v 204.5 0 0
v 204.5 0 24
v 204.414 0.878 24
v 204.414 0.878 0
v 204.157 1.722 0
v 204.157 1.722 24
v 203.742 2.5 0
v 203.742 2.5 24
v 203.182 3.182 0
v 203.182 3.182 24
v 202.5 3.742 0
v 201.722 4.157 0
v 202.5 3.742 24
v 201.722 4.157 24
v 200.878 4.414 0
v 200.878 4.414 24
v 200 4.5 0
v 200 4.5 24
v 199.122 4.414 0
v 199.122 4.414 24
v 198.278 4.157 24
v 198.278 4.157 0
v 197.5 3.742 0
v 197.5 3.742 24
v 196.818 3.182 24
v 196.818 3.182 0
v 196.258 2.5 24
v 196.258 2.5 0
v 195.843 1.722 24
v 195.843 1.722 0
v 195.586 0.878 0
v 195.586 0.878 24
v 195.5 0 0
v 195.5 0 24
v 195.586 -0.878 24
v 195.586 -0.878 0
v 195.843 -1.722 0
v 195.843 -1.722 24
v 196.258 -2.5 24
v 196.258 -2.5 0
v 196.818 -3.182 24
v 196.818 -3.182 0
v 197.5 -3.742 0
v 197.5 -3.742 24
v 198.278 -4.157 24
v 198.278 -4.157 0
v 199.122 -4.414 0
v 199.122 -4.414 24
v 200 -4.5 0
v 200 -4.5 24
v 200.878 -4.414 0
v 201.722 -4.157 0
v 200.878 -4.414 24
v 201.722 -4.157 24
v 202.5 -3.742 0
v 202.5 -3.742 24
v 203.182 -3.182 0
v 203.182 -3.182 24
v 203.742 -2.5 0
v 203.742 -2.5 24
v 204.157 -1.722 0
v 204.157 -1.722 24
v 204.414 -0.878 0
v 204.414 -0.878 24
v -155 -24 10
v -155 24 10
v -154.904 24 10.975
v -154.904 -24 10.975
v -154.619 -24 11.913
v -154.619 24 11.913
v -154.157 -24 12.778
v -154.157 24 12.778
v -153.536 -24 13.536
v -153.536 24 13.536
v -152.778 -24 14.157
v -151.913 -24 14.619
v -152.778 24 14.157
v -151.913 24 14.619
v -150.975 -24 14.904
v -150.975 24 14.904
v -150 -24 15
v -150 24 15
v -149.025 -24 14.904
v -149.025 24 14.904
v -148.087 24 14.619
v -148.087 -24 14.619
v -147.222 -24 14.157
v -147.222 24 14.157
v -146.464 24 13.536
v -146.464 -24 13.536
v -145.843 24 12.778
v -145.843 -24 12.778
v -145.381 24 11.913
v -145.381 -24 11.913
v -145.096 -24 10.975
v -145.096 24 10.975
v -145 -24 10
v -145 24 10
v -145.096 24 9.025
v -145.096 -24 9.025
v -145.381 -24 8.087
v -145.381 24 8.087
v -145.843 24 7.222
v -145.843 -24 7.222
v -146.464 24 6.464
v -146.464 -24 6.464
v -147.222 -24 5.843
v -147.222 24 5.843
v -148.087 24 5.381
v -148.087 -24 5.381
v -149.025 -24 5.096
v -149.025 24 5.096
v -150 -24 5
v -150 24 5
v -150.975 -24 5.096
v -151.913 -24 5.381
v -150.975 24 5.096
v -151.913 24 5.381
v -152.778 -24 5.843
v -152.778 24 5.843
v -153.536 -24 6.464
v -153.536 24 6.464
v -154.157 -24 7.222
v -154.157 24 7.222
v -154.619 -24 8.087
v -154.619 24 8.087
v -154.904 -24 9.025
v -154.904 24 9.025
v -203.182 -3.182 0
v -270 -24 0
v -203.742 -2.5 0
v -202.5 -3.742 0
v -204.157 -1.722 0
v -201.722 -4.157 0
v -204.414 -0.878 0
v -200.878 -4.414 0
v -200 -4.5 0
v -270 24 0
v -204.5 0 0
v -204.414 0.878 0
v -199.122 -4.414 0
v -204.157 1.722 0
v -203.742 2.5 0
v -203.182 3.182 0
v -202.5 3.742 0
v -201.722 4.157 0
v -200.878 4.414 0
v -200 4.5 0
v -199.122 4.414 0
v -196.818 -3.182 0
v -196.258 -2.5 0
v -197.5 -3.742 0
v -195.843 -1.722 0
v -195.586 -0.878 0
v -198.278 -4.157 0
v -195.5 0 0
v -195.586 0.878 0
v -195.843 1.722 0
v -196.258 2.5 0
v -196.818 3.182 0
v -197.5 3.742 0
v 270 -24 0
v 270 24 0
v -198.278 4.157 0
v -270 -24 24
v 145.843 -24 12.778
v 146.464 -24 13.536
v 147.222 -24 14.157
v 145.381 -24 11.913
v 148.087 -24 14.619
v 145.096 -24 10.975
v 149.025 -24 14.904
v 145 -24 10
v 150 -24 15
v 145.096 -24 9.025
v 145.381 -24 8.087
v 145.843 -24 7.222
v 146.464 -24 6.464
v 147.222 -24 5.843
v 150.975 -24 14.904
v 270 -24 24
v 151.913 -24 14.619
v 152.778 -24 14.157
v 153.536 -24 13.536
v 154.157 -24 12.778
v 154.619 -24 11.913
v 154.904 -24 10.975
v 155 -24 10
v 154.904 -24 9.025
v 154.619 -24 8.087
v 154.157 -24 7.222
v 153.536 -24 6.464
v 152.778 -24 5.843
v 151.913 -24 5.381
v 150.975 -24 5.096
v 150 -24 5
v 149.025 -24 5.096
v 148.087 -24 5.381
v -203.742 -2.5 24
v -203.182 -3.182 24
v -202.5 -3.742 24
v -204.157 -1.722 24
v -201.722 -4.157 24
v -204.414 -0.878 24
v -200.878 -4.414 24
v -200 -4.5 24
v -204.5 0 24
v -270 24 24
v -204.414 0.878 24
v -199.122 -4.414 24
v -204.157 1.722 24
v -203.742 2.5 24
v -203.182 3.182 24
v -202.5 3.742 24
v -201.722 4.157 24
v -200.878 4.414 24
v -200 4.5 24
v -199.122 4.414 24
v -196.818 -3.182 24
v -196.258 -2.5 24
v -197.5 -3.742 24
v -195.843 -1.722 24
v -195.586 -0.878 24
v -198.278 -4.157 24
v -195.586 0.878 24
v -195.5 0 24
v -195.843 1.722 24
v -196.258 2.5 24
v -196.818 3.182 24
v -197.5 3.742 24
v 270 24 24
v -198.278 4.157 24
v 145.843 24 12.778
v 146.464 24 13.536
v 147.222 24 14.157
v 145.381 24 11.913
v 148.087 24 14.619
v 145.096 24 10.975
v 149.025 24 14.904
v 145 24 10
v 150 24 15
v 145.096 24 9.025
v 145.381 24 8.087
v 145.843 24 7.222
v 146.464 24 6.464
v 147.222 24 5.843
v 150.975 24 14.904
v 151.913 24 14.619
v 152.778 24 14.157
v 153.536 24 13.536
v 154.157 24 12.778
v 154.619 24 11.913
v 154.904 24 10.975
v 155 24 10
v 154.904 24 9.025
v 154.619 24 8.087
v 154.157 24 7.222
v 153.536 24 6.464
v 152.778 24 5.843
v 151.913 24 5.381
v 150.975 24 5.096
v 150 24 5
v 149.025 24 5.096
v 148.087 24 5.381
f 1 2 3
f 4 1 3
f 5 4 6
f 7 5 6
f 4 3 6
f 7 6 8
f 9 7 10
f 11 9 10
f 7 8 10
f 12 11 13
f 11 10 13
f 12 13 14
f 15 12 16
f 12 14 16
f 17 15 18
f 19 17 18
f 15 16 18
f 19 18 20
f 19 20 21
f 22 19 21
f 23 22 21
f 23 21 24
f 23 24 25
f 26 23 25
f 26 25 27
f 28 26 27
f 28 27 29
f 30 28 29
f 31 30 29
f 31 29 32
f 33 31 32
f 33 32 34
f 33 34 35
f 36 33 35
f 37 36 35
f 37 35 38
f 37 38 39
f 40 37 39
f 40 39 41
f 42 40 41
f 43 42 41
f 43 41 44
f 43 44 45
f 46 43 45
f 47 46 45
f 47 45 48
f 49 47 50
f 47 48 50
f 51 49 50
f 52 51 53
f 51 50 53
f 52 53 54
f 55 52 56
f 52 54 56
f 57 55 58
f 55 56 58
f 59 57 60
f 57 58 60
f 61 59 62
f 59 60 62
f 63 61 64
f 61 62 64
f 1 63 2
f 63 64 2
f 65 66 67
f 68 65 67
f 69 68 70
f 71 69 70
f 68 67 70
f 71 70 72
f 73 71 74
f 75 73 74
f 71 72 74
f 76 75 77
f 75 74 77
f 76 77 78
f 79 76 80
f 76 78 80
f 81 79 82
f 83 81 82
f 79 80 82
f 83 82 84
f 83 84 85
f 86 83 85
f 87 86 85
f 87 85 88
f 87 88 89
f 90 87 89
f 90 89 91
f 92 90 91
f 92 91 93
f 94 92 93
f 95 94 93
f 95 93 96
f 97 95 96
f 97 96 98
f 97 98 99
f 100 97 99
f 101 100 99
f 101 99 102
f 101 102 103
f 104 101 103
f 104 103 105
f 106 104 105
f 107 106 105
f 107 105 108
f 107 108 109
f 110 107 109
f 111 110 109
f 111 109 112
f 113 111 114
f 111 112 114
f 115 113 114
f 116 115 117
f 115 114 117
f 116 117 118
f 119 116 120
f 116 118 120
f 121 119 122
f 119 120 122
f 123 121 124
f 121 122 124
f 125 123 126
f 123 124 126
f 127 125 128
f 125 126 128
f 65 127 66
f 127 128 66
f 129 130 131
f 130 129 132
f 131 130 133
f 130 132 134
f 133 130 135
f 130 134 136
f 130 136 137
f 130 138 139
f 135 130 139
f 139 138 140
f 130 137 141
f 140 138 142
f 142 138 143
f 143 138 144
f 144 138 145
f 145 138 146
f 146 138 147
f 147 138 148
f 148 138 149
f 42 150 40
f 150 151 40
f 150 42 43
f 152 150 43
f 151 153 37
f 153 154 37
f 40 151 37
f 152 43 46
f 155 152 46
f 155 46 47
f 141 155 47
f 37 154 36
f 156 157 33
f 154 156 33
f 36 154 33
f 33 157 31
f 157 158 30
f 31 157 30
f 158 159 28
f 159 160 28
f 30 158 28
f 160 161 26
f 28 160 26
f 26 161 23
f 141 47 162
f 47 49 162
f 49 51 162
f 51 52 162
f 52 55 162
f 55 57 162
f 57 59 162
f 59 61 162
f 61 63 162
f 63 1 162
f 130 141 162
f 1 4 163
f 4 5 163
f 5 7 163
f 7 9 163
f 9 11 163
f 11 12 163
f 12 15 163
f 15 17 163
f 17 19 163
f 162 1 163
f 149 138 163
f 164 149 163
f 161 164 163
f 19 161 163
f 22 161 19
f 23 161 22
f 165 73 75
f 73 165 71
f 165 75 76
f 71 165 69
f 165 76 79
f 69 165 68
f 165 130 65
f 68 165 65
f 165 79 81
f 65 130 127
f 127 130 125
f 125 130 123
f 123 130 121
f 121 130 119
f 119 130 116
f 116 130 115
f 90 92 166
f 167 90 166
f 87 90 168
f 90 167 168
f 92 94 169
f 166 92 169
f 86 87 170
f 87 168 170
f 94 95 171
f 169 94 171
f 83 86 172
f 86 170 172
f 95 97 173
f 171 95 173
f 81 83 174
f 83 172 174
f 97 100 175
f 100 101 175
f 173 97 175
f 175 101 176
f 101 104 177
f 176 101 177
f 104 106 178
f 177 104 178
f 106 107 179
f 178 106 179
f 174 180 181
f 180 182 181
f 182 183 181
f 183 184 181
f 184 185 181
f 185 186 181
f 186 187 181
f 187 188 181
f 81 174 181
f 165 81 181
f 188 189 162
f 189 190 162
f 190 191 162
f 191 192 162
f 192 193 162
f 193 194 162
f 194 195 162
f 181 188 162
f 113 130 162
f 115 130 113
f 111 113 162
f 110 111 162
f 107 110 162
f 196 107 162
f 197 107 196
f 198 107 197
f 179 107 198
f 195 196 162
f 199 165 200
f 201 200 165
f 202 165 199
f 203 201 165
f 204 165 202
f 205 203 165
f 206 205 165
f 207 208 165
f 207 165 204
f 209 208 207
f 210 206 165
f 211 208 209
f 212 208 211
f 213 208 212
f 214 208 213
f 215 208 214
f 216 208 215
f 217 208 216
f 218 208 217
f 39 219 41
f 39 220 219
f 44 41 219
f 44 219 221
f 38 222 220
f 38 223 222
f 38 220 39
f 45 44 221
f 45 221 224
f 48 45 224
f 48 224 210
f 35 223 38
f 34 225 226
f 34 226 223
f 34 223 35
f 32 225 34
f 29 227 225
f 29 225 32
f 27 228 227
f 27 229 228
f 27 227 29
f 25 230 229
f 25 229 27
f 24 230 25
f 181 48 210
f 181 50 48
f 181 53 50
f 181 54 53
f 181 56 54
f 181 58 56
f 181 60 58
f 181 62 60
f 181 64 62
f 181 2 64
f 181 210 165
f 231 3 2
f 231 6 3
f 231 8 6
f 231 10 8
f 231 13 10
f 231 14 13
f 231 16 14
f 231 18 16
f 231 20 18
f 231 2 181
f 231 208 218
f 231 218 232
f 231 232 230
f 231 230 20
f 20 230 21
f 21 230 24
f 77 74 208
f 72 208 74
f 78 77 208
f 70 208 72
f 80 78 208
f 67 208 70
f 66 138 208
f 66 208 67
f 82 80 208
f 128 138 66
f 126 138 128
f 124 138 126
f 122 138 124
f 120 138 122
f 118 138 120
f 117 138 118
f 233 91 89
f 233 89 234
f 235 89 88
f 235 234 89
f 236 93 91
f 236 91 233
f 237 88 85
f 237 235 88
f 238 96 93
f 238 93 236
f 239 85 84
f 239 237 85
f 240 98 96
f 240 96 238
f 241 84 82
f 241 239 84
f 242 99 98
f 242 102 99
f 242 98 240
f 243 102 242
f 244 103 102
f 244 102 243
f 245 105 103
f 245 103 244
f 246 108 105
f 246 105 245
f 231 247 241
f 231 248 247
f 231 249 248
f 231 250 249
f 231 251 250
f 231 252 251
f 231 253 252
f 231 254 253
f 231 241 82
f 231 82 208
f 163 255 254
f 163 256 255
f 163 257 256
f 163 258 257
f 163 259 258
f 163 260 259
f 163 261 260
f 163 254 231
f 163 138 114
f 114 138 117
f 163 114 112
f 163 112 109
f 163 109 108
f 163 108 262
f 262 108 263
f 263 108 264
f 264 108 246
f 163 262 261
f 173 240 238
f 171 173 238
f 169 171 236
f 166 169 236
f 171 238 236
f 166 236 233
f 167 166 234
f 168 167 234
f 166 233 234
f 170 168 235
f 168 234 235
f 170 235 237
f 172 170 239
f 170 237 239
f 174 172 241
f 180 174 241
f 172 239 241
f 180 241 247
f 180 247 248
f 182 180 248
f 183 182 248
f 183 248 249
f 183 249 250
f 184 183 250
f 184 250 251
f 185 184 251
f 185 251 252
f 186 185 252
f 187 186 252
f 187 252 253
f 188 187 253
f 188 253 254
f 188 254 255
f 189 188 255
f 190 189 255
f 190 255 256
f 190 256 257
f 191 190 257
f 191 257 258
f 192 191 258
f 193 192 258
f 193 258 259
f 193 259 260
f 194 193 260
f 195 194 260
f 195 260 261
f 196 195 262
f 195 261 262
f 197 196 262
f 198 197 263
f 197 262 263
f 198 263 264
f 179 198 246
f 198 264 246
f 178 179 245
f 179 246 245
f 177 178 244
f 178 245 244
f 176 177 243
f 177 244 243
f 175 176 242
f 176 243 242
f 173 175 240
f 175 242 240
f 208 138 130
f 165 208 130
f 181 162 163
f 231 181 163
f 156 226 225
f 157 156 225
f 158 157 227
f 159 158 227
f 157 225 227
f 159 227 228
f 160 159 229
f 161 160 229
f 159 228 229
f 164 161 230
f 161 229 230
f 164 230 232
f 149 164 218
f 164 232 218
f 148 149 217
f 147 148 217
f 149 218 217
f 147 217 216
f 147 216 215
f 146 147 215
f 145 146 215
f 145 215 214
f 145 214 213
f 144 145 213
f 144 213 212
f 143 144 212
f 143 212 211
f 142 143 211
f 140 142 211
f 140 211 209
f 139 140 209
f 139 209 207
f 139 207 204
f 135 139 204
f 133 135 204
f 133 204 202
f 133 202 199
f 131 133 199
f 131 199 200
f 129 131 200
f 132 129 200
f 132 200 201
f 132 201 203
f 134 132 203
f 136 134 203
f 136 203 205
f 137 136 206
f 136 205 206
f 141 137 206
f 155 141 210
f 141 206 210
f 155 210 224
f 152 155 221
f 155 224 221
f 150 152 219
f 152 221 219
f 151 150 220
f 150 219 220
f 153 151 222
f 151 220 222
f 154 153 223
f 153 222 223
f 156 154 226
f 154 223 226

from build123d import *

# Parameters (mm, degrees)
ESQUISSE1_W             = 639
ESQUISSE1_H             = 48
BOSS_EXTRU_1_DEPTH      = 24
ENL_V_MAT_EXTRU_1_DEPTH = 322.297759096
ESQUISSE3_R             = 4.5
ENL_V_MAT_EXTRU_2_DEPTH = 322.297759096
ESQUISSE5_R             = 5
ENL_V_MAT_EXTRU_4_DEPTH = 324.975693533
ENL_V_MAT_EXTRU_5_DEPTH = 322.297759096


with BuildPart() as part:
    # Esquisse1 → Boss.-Extru.1 (new body)
    with BuildSketch(Plane.XY):
        Rectangle(ESQUISSE1_W, ESQUISSE1_H)
    extrude(amount=BOSS_EXTRU_1_DEPTH)

    # Esquisse2 → Enlèv. mat.-Extru.1 (cut, through all)
    with BuildSketch(Plane.XY.offset(24)):
        Polygon((-319.5, 24), (-271.5, -24), (-319.5, -24), align=None)
        Polygon((319.5, 24), (271.5, -24), (319.5, -24), align=None)
    extrude(amount=-ENL_V_MAT_EXTRU_1_DEPTH, mode=Mode.SUBTRACT)

    # Esquisse3 → Enlèv. mat.-Extru.2 (cut, through all)
    with BuildSketch(Plane.XY.offset(24)):
        with Locations((-200, 0)):
            Circle(ESQUISSE3_R)
        with Locations((200, 0)):
            Circle(ESQUISSE3_R)
    extrude(amount=-ENL_V_MAT_EXTRU_2_DEPTH, mode=Mode.SUBTRACT)

    # Esquisse5 → Enlèv. mat.-Extru.4 (cut, through all)
    with BuildSketch(Plane(origin=(0, 24, 0), x_dir=(1, 0, 0), z_dir=(0, 1, 0))):
        with Locations(Location((-150, -10, 0), (0, 0, 180))):
            Circle(ESQUISSE5_R)
        with Locations(Location((150, -10, 0), (0, 0, 180))):
            Circle(ESQUISSE5_R)
    extrude(amount=-ENL_V_MAT_EXTRU_4_DEPTH, mode=Mode.SUBTRACT)

    # Esquisse6 → Enlèv. mat.-Extru.5 (cut, through all)
    with BuildSketch(Plane(origin=(0, 0, 0), x_dir=(-1, 0, 0), z_dir=(0, 0, -1))):
        Polygon((-270, -25.5), (-270, 24), (-319.5, 24), align=None)
        Polygon((270, -25.5), (319.5, 24), (270, 24), align=None)
    extrude(amount=-ENL_V_MAT_EXTRU_5_DEPTH, mode=Mode.SUBTRACT)


solid = part.part
